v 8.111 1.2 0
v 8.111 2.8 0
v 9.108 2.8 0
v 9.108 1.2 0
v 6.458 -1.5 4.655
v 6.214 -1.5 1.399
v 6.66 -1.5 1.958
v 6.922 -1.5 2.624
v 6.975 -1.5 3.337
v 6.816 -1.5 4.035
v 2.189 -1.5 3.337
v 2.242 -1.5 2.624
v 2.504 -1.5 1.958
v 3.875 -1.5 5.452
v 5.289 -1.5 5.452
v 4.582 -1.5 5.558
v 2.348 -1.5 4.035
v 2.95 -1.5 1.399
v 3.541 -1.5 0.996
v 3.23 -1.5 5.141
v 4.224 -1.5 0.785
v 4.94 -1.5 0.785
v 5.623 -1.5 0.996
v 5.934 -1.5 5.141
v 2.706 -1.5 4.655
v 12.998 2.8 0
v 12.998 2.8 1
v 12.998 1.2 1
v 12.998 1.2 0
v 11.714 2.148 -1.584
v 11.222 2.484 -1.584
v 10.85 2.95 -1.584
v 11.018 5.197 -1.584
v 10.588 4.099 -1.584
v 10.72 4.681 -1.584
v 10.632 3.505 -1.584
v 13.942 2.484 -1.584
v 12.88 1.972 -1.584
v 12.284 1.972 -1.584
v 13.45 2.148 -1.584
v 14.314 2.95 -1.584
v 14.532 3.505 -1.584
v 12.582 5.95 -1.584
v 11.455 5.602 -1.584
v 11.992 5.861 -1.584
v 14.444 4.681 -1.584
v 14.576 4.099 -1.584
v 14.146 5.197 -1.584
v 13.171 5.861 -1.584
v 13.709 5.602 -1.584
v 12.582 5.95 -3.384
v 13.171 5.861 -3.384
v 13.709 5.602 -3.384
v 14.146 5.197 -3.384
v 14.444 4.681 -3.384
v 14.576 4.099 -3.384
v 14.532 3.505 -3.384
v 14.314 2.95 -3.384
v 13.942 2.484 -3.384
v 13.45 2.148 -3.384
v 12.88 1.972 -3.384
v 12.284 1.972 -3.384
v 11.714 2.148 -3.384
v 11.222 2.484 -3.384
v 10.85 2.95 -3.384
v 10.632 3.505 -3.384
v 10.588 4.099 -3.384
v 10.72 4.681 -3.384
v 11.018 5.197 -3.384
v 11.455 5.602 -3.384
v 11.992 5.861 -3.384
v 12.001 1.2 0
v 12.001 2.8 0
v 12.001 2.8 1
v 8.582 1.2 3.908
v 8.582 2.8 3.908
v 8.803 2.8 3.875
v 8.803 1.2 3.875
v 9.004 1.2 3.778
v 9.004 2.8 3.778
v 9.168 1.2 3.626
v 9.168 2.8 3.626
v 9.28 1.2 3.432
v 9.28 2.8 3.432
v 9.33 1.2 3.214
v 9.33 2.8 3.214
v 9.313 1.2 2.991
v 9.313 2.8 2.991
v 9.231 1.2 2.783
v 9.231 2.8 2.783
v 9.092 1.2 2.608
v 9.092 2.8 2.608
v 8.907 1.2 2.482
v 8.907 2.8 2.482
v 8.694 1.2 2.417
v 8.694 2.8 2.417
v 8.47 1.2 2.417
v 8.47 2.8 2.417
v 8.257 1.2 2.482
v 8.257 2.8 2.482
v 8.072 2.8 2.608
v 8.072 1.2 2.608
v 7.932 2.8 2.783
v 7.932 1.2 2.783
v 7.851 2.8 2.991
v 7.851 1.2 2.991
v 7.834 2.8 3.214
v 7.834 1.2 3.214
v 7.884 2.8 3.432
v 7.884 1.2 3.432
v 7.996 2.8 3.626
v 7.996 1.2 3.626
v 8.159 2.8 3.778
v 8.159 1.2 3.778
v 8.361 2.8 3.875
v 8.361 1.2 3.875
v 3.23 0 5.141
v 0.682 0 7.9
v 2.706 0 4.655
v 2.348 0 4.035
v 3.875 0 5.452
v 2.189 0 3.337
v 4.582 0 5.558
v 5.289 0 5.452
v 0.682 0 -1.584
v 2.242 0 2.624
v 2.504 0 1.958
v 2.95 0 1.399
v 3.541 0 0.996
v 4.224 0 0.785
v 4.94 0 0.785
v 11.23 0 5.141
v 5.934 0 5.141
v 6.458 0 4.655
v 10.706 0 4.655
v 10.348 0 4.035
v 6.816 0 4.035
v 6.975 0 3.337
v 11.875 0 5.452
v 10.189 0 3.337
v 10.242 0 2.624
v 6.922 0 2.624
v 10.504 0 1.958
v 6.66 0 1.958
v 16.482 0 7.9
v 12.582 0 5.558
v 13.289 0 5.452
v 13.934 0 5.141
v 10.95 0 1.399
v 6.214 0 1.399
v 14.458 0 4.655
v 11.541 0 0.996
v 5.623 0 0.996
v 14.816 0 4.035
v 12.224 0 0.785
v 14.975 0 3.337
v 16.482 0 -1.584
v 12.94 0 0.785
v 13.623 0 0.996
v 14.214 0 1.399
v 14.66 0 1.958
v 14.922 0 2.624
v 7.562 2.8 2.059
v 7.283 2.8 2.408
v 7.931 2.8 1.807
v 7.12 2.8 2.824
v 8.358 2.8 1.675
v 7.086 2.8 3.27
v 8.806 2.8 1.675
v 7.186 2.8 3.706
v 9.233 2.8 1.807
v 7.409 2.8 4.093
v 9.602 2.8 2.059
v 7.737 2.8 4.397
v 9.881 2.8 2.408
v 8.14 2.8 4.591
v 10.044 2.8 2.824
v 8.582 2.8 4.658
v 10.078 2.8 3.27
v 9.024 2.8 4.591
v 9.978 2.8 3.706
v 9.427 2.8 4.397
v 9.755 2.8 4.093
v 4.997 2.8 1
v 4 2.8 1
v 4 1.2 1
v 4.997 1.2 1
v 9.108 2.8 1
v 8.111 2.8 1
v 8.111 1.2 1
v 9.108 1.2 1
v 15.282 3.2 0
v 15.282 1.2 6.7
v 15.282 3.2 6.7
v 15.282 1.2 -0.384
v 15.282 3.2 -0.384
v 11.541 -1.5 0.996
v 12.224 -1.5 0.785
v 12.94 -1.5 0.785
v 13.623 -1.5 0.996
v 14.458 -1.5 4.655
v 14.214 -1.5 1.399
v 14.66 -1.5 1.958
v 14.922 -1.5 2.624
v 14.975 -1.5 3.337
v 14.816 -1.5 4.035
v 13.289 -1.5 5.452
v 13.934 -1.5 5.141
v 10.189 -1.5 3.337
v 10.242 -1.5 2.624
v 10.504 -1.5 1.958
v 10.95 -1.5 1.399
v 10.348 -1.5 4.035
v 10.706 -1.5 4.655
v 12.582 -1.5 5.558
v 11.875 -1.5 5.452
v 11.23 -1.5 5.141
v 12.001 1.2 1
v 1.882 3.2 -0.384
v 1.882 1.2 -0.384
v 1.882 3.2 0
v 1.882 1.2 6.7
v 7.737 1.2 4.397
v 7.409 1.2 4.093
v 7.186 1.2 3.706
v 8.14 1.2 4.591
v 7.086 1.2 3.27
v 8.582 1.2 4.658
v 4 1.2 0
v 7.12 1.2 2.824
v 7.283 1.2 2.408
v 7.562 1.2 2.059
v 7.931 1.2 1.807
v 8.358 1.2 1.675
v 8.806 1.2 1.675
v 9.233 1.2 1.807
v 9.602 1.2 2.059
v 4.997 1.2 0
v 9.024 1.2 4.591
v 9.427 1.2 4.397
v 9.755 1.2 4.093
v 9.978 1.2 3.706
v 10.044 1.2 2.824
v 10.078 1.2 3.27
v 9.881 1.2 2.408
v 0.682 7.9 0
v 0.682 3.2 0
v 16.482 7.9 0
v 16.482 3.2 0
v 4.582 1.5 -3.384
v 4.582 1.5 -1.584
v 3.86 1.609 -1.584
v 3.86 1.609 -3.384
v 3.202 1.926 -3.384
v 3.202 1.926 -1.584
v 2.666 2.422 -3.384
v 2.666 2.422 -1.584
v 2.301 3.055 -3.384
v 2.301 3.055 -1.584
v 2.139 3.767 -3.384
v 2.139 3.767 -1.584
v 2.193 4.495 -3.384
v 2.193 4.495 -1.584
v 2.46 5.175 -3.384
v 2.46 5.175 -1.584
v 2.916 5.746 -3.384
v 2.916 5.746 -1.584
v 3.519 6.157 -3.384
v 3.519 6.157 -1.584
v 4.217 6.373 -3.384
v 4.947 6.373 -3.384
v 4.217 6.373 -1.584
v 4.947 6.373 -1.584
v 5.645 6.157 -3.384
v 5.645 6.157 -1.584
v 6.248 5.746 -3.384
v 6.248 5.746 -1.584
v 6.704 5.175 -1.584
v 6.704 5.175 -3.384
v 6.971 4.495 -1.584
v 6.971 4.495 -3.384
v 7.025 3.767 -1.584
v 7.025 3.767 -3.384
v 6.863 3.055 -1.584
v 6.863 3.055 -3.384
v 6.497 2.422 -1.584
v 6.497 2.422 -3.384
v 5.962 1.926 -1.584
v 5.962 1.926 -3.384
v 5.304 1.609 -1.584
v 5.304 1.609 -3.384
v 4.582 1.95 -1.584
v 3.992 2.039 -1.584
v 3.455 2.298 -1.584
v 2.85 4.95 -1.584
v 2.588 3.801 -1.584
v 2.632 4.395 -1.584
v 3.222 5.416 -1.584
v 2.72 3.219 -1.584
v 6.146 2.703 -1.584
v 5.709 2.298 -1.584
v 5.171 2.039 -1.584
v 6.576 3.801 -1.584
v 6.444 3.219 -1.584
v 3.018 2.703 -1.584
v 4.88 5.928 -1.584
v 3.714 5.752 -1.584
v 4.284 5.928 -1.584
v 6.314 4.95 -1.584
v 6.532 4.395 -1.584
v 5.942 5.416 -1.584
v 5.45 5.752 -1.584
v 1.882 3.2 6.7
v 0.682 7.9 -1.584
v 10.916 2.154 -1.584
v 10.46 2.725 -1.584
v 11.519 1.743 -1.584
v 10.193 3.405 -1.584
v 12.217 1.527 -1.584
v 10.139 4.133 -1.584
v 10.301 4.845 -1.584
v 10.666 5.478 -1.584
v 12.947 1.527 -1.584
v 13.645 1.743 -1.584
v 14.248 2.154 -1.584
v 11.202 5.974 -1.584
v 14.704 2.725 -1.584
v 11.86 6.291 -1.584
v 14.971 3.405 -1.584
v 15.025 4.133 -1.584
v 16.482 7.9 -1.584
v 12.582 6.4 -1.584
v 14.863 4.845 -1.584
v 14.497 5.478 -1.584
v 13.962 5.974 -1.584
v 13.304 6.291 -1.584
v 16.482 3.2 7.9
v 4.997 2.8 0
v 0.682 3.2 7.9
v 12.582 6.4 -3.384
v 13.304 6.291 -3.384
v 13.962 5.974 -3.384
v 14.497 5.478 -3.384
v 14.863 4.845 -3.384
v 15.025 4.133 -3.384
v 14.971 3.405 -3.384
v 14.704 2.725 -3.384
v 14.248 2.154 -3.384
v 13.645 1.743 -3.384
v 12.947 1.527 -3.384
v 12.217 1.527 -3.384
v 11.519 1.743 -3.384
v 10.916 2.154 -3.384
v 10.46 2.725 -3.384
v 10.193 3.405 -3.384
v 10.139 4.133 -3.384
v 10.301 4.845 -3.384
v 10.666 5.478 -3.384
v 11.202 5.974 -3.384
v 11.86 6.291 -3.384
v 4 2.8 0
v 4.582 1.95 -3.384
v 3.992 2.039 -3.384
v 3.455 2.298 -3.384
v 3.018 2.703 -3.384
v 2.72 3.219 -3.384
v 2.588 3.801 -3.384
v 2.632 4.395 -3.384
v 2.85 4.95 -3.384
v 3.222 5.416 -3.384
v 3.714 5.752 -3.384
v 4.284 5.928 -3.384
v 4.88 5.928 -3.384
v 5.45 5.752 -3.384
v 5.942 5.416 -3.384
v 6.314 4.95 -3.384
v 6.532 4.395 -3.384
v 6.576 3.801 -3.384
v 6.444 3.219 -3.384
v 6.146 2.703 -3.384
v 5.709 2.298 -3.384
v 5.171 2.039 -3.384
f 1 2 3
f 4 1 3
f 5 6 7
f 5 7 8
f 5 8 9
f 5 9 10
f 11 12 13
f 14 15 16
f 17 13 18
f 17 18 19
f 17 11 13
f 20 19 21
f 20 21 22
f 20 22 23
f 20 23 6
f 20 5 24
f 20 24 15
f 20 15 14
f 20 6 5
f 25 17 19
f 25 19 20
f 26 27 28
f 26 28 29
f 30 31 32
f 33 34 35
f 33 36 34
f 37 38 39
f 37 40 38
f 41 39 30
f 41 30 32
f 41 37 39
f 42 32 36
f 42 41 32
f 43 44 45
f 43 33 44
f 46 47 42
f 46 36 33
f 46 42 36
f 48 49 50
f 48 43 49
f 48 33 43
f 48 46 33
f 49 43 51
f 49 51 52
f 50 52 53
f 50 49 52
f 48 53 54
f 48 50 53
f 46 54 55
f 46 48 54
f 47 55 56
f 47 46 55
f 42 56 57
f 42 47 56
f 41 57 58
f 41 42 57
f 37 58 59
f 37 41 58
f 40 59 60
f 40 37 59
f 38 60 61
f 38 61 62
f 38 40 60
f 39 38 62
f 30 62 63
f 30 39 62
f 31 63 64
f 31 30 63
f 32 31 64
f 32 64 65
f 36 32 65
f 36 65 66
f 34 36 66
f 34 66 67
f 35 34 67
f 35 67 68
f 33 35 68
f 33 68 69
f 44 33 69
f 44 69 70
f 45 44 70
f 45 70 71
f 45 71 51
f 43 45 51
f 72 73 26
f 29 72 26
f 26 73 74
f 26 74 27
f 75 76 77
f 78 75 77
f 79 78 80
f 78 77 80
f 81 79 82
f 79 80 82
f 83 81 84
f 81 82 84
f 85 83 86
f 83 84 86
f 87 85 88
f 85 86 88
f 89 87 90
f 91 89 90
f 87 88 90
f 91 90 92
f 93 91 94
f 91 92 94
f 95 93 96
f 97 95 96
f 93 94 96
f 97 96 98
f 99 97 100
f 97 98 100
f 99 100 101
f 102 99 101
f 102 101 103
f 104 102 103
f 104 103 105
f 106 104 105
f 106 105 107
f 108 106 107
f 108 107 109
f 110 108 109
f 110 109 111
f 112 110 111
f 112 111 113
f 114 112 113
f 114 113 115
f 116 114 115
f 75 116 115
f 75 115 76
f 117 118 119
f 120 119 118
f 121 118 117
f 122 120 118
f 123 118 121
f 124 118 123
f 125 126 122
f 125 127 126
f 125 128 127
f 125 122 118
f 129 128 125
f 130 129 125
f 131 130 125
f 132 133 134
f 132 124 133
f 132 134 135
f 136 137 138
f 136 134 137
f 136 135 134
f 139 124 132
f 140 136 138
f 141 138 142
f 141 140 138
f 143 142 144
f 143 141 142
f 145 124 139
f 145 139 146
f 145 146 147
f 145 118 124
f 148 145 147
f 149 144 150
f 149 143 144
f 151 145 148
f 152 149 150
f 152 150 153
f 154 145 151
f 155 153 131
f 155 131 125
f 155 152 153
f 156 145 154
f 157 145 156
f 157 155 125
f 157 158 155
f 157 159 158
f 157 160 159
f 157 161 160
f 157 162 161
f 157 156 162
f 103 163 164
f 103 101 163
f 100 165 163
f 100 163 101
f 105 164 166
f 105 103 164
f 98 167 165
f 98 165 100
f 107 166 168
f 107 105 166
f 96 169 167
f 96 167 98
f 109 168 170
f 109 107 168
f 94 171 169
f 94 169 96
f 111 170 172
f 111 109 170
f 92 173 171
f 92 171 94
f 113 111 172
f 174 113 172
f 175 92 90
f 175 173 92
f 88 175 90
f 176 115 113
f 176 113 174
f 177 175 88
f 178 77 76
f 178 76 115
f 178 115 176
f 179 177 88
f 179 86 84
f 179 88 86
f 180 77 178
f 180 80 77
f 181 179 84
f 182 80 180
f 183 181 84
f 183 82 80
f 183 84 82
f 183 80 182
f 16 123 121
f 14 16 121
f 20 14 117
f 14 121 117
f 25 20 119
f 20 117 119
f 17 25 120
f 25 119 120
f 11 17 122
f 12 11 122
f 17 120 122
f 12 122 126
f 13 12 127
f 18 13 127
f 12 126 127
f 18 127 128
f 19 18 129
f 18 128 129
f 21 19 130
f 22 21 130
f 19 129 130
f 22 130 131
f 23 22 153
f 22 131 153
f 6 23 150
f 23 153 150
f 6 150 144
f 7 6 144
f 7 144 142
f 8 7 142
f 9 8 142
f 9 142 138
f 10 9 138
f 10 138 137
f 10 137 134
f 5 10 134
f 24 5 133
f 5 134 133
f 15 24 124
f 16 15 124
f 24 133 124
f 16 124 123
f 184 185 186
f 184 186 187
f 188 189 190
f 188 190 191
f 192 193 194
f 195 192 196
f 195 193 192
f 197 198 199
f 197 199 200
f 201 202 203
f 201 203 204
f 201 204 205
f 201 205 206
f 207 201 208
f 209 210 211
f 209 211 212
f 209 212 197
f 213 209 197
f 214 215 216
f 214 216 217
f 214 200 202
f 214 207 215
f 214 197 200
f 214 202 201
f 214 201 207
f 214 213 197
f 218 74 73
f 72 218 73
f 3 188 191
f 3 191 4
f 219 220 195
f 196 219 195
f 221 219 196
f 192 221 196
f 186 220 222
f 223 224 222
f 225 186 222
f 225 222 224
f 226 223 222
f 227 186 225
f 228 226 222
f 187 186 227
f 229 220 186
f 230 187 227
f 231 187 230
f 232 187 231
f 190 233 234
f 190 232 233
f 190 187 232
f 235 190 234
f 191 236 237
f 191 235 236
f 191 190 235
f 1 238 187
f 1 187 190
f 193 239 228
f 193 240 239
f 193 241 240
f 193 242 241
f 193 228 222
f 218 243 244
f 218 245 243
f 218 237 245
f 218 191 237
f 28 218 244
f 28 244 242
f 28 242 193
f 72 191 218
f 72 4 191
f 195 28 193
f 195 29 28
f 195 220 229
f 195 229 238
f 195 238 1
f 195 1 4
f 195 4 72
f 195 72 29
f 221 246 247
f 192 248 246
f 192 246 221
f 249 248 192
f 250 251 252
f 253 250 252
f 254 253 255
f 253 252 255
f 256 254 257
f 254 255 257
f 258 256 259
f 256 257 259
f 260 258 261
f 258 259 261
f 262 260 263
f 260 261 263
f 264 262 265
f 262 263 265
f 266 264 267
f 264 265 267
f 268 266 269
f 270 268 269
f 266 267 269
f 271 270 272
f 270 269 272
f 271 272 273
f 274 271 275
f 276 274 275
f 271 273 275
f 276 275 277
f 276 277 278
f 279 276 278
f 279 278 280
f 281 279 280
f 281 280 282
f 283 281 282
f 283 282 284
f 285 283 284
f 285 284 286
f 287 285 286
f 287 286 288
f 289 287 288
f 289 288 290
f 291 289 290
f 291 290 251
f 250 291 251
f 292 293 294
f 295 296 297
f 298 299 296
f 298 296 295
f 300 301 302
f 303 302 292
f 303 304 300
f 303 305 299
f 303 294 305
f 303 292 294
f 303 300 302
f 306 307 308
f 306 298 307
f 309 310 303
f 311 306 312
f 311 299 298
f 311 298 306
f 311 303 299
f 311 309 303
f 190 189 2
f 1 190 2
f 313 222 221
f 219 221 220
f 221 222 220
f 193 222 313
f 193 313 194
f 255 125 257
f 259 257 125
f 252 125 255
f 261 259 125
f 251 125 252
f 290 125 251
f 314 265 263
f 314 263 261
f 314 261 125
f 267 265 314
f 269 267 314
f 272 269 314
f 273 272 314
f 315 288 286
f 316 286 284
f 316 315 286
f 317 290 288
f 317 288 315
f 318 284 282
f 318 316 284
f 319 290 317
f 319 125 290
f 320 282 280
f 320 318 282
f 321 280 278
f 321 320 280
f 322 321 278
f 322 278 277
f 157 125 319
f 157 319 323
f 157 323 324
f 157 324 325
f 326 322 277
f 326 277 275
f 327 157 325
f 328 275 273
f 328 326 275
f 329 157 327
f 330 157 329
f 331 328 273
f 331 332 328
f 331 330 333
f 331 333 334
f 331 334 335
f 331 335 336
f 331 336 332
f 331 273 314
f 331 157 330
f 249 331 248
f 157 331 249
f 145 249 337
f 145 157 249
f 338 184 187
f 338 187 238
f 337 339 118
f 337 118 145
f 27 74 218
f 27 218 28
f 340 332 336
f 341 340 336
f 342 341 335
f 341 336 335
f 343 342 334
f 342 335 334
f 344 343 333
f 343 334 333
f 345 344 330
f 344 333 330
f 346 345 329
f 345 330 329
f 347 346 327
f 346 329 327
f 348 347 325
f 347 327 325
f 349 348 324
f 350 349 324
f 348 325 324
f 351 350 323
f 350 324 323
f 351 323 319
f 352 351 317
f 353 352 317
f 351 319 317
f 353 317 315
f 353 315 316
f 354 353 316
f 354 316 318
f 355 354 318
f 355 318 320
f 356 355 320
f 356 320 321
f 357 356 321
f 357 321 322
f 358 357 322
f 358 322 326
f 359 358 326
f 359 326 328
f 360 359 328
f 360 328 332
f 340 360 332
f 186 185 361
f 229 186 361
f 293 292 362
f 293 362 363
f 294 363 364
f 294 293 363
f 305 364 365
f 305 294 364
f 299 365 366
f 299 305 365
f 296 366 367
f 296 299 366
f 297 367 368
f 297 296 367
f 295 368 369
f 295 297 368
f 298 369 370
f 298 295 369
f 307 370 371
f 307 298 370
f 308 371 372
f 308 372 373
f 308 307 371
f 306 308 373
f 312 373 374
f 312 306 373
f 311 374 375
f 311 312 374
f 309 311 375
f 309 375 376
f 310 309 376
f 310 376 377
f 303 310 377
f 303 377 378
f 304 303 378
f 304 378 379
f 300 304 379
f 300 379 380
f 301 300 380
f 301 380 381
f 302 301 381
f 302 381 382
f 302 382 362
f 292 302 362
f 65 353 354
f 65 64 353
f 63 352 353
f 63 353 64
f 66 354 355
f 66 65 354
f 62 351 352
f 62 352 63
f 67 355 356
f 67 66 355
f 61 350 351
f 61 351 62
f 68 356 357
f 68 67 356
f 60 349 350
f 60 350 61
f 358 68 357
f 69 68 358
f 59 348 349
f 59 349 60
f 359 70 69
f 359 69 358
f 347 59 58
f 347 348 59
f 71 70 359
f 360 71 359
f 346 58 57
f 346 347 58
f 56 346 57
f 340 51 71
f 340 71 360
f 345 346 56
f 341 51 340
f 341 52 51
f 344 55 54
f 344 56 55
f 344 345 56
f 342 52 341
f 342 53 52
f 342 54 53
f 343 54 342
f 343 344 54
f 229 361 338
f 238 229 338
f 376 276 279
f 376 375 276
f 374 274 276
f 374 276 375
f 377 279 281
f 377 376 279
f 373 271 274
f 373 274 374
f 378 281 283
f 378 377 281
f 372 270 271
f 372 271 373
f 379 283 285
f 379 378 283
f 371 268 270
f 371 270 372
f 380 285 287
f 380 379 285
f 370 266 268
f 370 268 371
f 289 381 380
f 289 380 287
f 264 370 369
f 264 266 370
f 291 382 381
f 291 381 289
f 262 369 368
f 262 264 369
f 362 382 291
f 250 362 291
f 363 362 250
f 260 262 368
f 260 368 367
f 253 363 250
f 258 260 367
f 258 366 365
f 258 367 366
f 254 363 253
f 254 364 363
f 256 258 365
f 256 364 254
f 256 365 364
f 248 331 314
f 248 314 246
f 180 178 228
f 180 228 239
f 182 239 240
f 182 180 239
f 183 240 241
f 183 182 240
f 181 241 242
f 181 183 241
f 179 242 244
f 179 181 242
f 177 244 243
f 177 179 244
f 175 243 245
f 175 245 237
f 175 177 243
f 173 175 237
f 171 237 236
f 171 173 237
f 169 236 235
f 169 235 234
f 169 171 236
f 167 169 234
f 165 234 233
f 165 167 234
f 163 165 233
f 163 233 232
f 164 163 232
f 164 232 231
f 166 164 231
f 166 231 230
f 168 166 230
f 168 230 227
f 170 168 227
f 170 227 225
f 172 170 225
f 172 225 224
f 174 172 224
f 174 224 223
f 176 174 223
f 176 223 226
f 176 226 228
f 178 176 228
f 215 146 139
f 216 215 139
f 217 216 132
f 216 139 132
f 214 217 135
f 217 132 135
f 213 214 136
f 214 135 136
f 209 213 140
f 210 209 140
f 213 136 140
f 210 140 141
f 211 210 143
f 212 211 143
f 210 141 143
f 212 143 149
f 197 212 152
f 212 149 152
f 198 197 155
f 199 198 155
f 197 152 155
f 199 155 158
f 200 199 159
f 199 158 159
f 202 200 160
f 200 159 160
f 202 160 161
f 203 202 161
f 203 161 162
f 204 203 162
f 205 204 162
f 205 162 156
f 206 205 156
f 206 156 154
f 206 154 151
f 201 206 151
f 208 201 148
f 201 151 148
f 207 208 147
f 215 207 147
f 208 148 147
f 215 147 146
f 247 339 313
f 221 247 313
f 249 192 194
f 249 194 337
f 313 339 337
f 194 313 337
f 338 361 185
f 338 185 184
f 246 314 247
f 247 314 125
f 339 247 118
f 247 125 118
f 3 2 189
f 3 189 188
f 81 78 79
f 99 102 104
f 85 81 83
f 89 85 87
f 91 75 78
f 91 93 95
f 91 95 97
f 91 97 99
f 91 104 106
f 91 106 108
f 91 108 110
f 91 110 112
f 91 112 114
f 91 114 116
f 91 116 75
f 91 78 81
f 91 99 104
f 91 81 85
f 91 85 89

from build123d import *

# Parameters (mm, degrees)
MAINBASESKETCH_W             = 15.8
MAINBASESKETCH_H             = 3.2
MAINBASEEXTRUDE_DEPTH        = 7.9
LCUTBLUE_DEPTH               = 19.555463972
LCUTBLUE_DEPTH_BACK          = 19.555463972
MADESLIMCUTSKETCH_W          = 7.9
MADESLIMCUTSKETCH_H          = 7.9
MADESLIMCUT_DEPTH            = 19.555463972
SHORTLEXTENSIONSKETCH_W      = 1.583745828
SHORTLEXTENSIONSKETCH_H      = 7.9
SHORTLUPPERCIRCLES_START     = -0.2
SHORTLUPPERCIRCLESSKETCH_R   = 2.45
SHORTLUPPERCIRCLESSKETCH_R_2 = 2
SHORTLUPPERCIRCLES_DEPTH     = 2
SHELL1_START                 = 1.2
SHELL1_OUTLINE_W             = 13.4
SHELL1_OUTLINE_H             = 7.083745828
SHELL1_DEPTH                 = 2
BOSS_EXTRUDE4_REACH          = 21.272
BOSS_EXTRUDE4_START          = -0.4
SKETCH89_R                   = 1.5
SKETCH89_R_2                 = 0.75
SKETCH89_W                   = 0.996828099
SKETCH89_H                   = 1
SKETCH89_W_2                 = 0.996828098
SKETCH90_R                   = 2.4
BOSS_EXTRUDE5_DEPTH          = 1.5


# Read off the part's stored shape, not the designer's step: Shell1
with BuildPart() as part:
    # MainBaseSketch → MainBaseExtrude (new, symmetric)
    with BuildSketch(Plane.XY):
        with Locations((8.581967213, 1.6)):
            Rectangle(MAINBASESKETCH_W, MAINBASESKETCH_H)
    extrude(amount=MAINBASEEXTRUDE_DEPTH, both=True)

    # LCUTBlueSketch → LCutBlue (cut, two sides: drawn at the far end of the back side and taken through both)
    with BuildSketch(Plane(origin=(0, 3.2, 0), x_dir=(1, 0, 0), z_dir=(0, 1, 0)).offset(-LCUTBLUE_DEPTH_BACK)):
        Polygon((8.581967213, 53.229874044), (8.581967213, 7.9), (8.581967213, 0), (16.481967213, 0), (61.811841258, 0), (125.917963912, 64.106122654), (72.688089868, 117.335996699), align=None)
    extrude(amount=LCUTBLUE_DEPTH + LCUTBLUE_DEPTH_BACK, mode=Mode.SUBTRACT)

    # MadeSlimCutSketch → MadeSlimCut (cut, through all)
    with BuildSketch(Plane.XZ):
        with Locations((4.631967213, -3.95)):
            Rectangle(MADESLIMCUTSKETCH_W, MADESLIMCUTSKETCH_H)
    extrude(amount=-MADESLIMCUT_DEPTH, mode=Mode.SUBTRACT)

    # ShortLExtension: sweep along a curve in space
    with BuildLine() as shortlextension_path:
        Line((0.681967213, 3.2, 0), (16.481967213, 3.2, 0))
    # ShortLExtensionSketch → ShortLExtension (sweep)
    with BuildSketch(Plane(origin=(16.481967213, 0, 0), x_dir=(0, 0, -1), z_dir=(1, 0, 0))):
        with Locations((0.791872914, 3.95)):
            Rectangle(SHORTLEXTENSIONSKETCH_W, SHORTLEXTENSIONSKETCH_H)
    sweep(path=shortlextension_path.line)

    # ShortLUpperCirclesSketch → ShortLUpperCircles (add)
    # profile 1 of 2: a face of its own
    with BuildSketch(Plane(origin=(0, 0, -1.583745828), x_dir=(-1, 0, 0), z_dir=(0, 0, -1)).offset(SHORTLUPPERCIRCLES_START)):
        with Locations(Location((-12.581967213, 3.95, 0), (0, 0, 90))):
            Circle(SHORTLUPPERCIRCLESSKETCH_R)
        with Locations(Location((-12.581967213, 3.95, 0), (0, 0, 90))):
            Circle(SHORTLUPPERCIRCLESSKETCH_R_2, mode=Mode.SUBTRACT)
    # profile 2 of 2: a face of its own
    with BuildSketch(Plane(origin=(0, 0, -1.583745828), x_dir=(-1, 0, 0), z_dir=(0, 0, -1)).offset(SHORTLUPPERCIRCLES_START)):
        with Locations(Location((-4.581967213, 3.95, 0), (0, 0, 270))):
            Circle(SHORTLUPPERCIRCLESSKETCH_R)
        with Locations(Location((-4.581967213, 3.95, 0), (0, 0, 270))):
            Circle(SHORTLUPPERCIRCLESSKETCH_R_2, mode=Mode.SUBTRACT)
    extrude(amount=SHORTLUPPERCIRCLES_DEPTH)

    # Shell1 outline → Shell1 (cut)
    with BuildSketch(Plane(origin=(0, 0, 0), x_dir=(1, 0, 0), z_dir=(0, 1, 0)).offset(SHELL1_START)):
        with Locations((8.581967213, -3.158127086)):
            Rectangle(SHELL1_OUTLINE_W, SHELL1_OUTLINE_H)
    extrude(amount=SHELL1_DEPTH, mode=Mode.SUBTRACT)

    # Sketch89 → Boss-Extrude4 (add, up to next)
    with BuildSketch(Plane(origin=(0, 3.2, 0), x_dir=(1, 0, 0), z_dir=(0, 1, 0)).offset(BOSS_EXTRUDE4_START), mode=Mode.PRIVATE) as boss_extrude4_sk1:
        with Locations(Location((8.581967213, -3.158127086, 0), (0, 0, 270))):
            Circle(SKETCH89_R)
        with Locations(Location((8.581967213, -3.158127086, 0), (0, 0, 270))):
            Circle(SKETCH89_R_2, mode=Mode.SUBTRACT)
    boss_extrude4_tool1 = extrude(boss_extrude4_sk1.sketch, amount=-BOSS_EXTRUDE4_REACH, mode=Mode.PRIVATE) - part.part
    # Sketch89 → Boss-Extrude4 (add, up to next)
    with BuildSketch(Plane(origin=(0, 3.2, 0), x_dir=(1, 0, 0), z_dir=(0, 1, 0)).offset(BOSS_EXTRUDE4_START), mode=Mode.PRIVATE) as boss_extrude4_sk2:
        with Locations((4.498879862, -0.5)):
            Rectangle(SKETCH89_W, SKETCH89_H)
    boss_extrude4_tool2 = extrude(boss_extrude4_sk2.sketch, amount=-BOSS_EXTRUDE4_REACH, mode=Mode.PRIVATE) - part.part
    # Sketch89 → Boss-Extrude4 (add, up to next)
    with BuildSketch(Plane(origin=(0, 3.2, 0), x_dir=(1, 0, 0), z_dir=(0, 1, 0)).offset(BOSS_EXTRUDE4_START), mode=Mode.PRIVATE) as boss_extrude4_sk3:
        with Locations((8.609734638, -0.5)):
            Rectangle(SKETCH89_W_2, SKETCH89_H)
    boss_extrude4_tool3 = extrude(boss_extrude4_sk3.sketch, amount=-BOSS_EXTRUDE4_REACH, mode=Mode.PRIVATE) - part.part
    # Sketch89 → Boss-Extrude4 (add, up to next)
    with BuildSketch(Plane(origin=(0, 3.2, 0), x_dir=(1, 0, 0), z_dir=(0, 1, 0)).offset(BOSS_EXTRUDE4_START), mode=Mode.PRIVATE) as boss_extrude4_sk4:
        with Locations((12.499284685, -0.5)):
            Rectangle(SKETCH89_W_2, SKETCH89_H)
    boss_extrude4_tool4 = extrude(boss_extrude4_sk4.sketch, amount=-BOSS_EXTRUDE4_REACH, mode=Mode.PRIVATE) - part.part
    add(boss_extrude4_tool1.solids().sort_by_distance((8.581967, 2.8, 1.700553))[0])
    add(boss_extrude4_tool2.solids().sort_by_distance((4.49888, 2.8, 0.5))[0])
    add(boss_extrude4_tool3.solids().sort_by_distance((8.609735, 2.8, 0.5))[0])
    add(boss_extrude4_tool4.solids().sort_by_distance((12.499285, 2.8, 0.5))[0])

    # Sketch90 → Boss-Extrude5 (add)
    with BuildSketch(Plane(origin=(0, 0, 0), x_dir=(-1, 0, 0), z_dir=(0, -1, 0))):
        with Locations(Location((-12.581967213, -3.158127086, 0), (0, 0, 270))):
            Circle(SKETCH90_R)
        with Locations(Location((-4.581967213, -3.158127086, 0), (0, 0, 270))):
            Circle(SKETCH90_R)
    extrude(amount=BOSS_EXTRUDE5_DEPTH)


solid = part.part
